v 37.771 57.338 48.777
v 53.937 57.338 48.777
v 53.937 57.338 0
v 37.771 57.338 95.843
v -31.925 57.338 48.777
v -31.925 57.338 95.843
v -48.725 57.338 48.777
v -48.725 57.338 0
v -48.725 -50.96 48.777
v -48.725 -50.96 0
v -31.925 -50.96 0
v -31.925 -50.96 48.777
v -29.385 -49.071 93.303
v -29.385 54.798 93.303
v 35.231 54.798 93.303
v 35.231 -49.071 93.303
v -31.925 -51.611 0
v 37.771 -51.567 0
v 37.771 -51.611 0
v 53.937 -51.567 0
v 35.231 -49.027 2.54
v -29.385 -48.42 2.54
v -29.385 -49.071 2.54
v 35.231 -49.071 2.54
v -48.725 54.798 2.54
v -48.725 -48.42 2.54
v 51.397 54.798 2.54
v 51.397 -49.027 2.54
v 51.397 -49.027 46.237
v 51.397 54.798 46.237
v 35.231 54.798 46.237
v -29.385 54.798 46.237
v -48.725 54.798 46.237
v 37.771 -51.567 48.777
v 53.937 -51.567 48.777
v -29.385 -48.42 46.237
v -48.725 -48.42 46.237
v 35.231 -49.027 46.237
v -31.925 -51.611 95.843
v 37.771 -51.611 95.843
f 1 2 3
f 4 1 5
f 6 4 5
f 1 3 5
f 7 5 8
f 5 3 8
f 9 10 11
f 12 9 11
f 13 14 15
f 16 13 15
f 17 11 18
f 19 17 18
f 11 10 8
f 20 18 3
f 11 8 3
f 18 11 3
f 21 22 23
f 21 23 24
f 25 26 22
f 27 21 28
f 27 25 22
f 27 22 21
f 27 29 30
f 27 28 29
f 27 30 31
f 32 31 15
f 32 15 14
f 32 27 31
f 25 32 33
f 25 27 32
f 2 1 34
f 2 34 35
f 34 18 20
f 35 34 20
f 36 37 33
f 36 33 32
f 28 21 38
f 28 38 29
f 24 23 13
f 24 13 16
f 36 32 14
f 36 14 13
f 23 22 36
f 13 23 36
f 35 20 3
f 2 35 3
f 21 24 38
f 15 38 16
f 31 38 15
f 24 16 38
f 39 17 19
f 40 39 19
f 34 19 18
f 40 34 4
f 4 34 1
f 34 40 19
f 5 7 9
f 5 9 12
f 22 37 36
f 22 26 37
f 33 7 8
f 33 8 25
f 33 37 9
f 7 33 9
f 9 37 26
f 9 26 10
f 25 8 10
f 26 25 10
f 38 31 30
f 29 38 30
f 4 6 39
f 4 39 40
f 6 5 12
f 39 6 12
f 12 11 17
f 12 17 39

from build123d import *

# Parameters (mm, degrees)
F1_DEPTH = 95.8433821797
F0_W     = 16.1665417254
F0_H     = 108.9052408934
F2_DEPTH = 48.777140677
F3_T     = -2.54


with BuildPart() as f1:
    # F0 (on Top) → F1 (new body)
    with BuildSketch(Plane.XY):
        Polygon((37.7709232271, 57.3377944529), (-31.9253392518, 57.3377944529), (-31.9253392518, -50.960008055), (-31.9253392518, -51.6111589968), (37.7709232271, -51.6111589968), (37.7709232271, -51.5674464405), align=None)
    extrude(amount=F1_DEPTH)

    # F0 (on Top) → F2 (join)
    with BuildSketch(Plane.XY):
        Polygon((-31.9253392518, -50.960008055), (-31.9253392518, 57.3377944529), (-48.7250611186, 57.3377944529), (-48.7250611186, -12.884741649), (-48.7250611186, -50.960008055), align=None)
        with Locations((45.8541940898, 2.8851740062)):
            Rectangle(F0_W, F0_H)
    extrude(amount=F2_DEPTH)

    # F3
    f3_openings = [f1.faces().sort_by_distance(p)[0] for p in [
        (-48.725061, 3.188893, 24.38857),
    ]]
    offset(amount=F3_T, openings=f3_openings, kind=Kind.INTERSECTION)


solid = f1.part
